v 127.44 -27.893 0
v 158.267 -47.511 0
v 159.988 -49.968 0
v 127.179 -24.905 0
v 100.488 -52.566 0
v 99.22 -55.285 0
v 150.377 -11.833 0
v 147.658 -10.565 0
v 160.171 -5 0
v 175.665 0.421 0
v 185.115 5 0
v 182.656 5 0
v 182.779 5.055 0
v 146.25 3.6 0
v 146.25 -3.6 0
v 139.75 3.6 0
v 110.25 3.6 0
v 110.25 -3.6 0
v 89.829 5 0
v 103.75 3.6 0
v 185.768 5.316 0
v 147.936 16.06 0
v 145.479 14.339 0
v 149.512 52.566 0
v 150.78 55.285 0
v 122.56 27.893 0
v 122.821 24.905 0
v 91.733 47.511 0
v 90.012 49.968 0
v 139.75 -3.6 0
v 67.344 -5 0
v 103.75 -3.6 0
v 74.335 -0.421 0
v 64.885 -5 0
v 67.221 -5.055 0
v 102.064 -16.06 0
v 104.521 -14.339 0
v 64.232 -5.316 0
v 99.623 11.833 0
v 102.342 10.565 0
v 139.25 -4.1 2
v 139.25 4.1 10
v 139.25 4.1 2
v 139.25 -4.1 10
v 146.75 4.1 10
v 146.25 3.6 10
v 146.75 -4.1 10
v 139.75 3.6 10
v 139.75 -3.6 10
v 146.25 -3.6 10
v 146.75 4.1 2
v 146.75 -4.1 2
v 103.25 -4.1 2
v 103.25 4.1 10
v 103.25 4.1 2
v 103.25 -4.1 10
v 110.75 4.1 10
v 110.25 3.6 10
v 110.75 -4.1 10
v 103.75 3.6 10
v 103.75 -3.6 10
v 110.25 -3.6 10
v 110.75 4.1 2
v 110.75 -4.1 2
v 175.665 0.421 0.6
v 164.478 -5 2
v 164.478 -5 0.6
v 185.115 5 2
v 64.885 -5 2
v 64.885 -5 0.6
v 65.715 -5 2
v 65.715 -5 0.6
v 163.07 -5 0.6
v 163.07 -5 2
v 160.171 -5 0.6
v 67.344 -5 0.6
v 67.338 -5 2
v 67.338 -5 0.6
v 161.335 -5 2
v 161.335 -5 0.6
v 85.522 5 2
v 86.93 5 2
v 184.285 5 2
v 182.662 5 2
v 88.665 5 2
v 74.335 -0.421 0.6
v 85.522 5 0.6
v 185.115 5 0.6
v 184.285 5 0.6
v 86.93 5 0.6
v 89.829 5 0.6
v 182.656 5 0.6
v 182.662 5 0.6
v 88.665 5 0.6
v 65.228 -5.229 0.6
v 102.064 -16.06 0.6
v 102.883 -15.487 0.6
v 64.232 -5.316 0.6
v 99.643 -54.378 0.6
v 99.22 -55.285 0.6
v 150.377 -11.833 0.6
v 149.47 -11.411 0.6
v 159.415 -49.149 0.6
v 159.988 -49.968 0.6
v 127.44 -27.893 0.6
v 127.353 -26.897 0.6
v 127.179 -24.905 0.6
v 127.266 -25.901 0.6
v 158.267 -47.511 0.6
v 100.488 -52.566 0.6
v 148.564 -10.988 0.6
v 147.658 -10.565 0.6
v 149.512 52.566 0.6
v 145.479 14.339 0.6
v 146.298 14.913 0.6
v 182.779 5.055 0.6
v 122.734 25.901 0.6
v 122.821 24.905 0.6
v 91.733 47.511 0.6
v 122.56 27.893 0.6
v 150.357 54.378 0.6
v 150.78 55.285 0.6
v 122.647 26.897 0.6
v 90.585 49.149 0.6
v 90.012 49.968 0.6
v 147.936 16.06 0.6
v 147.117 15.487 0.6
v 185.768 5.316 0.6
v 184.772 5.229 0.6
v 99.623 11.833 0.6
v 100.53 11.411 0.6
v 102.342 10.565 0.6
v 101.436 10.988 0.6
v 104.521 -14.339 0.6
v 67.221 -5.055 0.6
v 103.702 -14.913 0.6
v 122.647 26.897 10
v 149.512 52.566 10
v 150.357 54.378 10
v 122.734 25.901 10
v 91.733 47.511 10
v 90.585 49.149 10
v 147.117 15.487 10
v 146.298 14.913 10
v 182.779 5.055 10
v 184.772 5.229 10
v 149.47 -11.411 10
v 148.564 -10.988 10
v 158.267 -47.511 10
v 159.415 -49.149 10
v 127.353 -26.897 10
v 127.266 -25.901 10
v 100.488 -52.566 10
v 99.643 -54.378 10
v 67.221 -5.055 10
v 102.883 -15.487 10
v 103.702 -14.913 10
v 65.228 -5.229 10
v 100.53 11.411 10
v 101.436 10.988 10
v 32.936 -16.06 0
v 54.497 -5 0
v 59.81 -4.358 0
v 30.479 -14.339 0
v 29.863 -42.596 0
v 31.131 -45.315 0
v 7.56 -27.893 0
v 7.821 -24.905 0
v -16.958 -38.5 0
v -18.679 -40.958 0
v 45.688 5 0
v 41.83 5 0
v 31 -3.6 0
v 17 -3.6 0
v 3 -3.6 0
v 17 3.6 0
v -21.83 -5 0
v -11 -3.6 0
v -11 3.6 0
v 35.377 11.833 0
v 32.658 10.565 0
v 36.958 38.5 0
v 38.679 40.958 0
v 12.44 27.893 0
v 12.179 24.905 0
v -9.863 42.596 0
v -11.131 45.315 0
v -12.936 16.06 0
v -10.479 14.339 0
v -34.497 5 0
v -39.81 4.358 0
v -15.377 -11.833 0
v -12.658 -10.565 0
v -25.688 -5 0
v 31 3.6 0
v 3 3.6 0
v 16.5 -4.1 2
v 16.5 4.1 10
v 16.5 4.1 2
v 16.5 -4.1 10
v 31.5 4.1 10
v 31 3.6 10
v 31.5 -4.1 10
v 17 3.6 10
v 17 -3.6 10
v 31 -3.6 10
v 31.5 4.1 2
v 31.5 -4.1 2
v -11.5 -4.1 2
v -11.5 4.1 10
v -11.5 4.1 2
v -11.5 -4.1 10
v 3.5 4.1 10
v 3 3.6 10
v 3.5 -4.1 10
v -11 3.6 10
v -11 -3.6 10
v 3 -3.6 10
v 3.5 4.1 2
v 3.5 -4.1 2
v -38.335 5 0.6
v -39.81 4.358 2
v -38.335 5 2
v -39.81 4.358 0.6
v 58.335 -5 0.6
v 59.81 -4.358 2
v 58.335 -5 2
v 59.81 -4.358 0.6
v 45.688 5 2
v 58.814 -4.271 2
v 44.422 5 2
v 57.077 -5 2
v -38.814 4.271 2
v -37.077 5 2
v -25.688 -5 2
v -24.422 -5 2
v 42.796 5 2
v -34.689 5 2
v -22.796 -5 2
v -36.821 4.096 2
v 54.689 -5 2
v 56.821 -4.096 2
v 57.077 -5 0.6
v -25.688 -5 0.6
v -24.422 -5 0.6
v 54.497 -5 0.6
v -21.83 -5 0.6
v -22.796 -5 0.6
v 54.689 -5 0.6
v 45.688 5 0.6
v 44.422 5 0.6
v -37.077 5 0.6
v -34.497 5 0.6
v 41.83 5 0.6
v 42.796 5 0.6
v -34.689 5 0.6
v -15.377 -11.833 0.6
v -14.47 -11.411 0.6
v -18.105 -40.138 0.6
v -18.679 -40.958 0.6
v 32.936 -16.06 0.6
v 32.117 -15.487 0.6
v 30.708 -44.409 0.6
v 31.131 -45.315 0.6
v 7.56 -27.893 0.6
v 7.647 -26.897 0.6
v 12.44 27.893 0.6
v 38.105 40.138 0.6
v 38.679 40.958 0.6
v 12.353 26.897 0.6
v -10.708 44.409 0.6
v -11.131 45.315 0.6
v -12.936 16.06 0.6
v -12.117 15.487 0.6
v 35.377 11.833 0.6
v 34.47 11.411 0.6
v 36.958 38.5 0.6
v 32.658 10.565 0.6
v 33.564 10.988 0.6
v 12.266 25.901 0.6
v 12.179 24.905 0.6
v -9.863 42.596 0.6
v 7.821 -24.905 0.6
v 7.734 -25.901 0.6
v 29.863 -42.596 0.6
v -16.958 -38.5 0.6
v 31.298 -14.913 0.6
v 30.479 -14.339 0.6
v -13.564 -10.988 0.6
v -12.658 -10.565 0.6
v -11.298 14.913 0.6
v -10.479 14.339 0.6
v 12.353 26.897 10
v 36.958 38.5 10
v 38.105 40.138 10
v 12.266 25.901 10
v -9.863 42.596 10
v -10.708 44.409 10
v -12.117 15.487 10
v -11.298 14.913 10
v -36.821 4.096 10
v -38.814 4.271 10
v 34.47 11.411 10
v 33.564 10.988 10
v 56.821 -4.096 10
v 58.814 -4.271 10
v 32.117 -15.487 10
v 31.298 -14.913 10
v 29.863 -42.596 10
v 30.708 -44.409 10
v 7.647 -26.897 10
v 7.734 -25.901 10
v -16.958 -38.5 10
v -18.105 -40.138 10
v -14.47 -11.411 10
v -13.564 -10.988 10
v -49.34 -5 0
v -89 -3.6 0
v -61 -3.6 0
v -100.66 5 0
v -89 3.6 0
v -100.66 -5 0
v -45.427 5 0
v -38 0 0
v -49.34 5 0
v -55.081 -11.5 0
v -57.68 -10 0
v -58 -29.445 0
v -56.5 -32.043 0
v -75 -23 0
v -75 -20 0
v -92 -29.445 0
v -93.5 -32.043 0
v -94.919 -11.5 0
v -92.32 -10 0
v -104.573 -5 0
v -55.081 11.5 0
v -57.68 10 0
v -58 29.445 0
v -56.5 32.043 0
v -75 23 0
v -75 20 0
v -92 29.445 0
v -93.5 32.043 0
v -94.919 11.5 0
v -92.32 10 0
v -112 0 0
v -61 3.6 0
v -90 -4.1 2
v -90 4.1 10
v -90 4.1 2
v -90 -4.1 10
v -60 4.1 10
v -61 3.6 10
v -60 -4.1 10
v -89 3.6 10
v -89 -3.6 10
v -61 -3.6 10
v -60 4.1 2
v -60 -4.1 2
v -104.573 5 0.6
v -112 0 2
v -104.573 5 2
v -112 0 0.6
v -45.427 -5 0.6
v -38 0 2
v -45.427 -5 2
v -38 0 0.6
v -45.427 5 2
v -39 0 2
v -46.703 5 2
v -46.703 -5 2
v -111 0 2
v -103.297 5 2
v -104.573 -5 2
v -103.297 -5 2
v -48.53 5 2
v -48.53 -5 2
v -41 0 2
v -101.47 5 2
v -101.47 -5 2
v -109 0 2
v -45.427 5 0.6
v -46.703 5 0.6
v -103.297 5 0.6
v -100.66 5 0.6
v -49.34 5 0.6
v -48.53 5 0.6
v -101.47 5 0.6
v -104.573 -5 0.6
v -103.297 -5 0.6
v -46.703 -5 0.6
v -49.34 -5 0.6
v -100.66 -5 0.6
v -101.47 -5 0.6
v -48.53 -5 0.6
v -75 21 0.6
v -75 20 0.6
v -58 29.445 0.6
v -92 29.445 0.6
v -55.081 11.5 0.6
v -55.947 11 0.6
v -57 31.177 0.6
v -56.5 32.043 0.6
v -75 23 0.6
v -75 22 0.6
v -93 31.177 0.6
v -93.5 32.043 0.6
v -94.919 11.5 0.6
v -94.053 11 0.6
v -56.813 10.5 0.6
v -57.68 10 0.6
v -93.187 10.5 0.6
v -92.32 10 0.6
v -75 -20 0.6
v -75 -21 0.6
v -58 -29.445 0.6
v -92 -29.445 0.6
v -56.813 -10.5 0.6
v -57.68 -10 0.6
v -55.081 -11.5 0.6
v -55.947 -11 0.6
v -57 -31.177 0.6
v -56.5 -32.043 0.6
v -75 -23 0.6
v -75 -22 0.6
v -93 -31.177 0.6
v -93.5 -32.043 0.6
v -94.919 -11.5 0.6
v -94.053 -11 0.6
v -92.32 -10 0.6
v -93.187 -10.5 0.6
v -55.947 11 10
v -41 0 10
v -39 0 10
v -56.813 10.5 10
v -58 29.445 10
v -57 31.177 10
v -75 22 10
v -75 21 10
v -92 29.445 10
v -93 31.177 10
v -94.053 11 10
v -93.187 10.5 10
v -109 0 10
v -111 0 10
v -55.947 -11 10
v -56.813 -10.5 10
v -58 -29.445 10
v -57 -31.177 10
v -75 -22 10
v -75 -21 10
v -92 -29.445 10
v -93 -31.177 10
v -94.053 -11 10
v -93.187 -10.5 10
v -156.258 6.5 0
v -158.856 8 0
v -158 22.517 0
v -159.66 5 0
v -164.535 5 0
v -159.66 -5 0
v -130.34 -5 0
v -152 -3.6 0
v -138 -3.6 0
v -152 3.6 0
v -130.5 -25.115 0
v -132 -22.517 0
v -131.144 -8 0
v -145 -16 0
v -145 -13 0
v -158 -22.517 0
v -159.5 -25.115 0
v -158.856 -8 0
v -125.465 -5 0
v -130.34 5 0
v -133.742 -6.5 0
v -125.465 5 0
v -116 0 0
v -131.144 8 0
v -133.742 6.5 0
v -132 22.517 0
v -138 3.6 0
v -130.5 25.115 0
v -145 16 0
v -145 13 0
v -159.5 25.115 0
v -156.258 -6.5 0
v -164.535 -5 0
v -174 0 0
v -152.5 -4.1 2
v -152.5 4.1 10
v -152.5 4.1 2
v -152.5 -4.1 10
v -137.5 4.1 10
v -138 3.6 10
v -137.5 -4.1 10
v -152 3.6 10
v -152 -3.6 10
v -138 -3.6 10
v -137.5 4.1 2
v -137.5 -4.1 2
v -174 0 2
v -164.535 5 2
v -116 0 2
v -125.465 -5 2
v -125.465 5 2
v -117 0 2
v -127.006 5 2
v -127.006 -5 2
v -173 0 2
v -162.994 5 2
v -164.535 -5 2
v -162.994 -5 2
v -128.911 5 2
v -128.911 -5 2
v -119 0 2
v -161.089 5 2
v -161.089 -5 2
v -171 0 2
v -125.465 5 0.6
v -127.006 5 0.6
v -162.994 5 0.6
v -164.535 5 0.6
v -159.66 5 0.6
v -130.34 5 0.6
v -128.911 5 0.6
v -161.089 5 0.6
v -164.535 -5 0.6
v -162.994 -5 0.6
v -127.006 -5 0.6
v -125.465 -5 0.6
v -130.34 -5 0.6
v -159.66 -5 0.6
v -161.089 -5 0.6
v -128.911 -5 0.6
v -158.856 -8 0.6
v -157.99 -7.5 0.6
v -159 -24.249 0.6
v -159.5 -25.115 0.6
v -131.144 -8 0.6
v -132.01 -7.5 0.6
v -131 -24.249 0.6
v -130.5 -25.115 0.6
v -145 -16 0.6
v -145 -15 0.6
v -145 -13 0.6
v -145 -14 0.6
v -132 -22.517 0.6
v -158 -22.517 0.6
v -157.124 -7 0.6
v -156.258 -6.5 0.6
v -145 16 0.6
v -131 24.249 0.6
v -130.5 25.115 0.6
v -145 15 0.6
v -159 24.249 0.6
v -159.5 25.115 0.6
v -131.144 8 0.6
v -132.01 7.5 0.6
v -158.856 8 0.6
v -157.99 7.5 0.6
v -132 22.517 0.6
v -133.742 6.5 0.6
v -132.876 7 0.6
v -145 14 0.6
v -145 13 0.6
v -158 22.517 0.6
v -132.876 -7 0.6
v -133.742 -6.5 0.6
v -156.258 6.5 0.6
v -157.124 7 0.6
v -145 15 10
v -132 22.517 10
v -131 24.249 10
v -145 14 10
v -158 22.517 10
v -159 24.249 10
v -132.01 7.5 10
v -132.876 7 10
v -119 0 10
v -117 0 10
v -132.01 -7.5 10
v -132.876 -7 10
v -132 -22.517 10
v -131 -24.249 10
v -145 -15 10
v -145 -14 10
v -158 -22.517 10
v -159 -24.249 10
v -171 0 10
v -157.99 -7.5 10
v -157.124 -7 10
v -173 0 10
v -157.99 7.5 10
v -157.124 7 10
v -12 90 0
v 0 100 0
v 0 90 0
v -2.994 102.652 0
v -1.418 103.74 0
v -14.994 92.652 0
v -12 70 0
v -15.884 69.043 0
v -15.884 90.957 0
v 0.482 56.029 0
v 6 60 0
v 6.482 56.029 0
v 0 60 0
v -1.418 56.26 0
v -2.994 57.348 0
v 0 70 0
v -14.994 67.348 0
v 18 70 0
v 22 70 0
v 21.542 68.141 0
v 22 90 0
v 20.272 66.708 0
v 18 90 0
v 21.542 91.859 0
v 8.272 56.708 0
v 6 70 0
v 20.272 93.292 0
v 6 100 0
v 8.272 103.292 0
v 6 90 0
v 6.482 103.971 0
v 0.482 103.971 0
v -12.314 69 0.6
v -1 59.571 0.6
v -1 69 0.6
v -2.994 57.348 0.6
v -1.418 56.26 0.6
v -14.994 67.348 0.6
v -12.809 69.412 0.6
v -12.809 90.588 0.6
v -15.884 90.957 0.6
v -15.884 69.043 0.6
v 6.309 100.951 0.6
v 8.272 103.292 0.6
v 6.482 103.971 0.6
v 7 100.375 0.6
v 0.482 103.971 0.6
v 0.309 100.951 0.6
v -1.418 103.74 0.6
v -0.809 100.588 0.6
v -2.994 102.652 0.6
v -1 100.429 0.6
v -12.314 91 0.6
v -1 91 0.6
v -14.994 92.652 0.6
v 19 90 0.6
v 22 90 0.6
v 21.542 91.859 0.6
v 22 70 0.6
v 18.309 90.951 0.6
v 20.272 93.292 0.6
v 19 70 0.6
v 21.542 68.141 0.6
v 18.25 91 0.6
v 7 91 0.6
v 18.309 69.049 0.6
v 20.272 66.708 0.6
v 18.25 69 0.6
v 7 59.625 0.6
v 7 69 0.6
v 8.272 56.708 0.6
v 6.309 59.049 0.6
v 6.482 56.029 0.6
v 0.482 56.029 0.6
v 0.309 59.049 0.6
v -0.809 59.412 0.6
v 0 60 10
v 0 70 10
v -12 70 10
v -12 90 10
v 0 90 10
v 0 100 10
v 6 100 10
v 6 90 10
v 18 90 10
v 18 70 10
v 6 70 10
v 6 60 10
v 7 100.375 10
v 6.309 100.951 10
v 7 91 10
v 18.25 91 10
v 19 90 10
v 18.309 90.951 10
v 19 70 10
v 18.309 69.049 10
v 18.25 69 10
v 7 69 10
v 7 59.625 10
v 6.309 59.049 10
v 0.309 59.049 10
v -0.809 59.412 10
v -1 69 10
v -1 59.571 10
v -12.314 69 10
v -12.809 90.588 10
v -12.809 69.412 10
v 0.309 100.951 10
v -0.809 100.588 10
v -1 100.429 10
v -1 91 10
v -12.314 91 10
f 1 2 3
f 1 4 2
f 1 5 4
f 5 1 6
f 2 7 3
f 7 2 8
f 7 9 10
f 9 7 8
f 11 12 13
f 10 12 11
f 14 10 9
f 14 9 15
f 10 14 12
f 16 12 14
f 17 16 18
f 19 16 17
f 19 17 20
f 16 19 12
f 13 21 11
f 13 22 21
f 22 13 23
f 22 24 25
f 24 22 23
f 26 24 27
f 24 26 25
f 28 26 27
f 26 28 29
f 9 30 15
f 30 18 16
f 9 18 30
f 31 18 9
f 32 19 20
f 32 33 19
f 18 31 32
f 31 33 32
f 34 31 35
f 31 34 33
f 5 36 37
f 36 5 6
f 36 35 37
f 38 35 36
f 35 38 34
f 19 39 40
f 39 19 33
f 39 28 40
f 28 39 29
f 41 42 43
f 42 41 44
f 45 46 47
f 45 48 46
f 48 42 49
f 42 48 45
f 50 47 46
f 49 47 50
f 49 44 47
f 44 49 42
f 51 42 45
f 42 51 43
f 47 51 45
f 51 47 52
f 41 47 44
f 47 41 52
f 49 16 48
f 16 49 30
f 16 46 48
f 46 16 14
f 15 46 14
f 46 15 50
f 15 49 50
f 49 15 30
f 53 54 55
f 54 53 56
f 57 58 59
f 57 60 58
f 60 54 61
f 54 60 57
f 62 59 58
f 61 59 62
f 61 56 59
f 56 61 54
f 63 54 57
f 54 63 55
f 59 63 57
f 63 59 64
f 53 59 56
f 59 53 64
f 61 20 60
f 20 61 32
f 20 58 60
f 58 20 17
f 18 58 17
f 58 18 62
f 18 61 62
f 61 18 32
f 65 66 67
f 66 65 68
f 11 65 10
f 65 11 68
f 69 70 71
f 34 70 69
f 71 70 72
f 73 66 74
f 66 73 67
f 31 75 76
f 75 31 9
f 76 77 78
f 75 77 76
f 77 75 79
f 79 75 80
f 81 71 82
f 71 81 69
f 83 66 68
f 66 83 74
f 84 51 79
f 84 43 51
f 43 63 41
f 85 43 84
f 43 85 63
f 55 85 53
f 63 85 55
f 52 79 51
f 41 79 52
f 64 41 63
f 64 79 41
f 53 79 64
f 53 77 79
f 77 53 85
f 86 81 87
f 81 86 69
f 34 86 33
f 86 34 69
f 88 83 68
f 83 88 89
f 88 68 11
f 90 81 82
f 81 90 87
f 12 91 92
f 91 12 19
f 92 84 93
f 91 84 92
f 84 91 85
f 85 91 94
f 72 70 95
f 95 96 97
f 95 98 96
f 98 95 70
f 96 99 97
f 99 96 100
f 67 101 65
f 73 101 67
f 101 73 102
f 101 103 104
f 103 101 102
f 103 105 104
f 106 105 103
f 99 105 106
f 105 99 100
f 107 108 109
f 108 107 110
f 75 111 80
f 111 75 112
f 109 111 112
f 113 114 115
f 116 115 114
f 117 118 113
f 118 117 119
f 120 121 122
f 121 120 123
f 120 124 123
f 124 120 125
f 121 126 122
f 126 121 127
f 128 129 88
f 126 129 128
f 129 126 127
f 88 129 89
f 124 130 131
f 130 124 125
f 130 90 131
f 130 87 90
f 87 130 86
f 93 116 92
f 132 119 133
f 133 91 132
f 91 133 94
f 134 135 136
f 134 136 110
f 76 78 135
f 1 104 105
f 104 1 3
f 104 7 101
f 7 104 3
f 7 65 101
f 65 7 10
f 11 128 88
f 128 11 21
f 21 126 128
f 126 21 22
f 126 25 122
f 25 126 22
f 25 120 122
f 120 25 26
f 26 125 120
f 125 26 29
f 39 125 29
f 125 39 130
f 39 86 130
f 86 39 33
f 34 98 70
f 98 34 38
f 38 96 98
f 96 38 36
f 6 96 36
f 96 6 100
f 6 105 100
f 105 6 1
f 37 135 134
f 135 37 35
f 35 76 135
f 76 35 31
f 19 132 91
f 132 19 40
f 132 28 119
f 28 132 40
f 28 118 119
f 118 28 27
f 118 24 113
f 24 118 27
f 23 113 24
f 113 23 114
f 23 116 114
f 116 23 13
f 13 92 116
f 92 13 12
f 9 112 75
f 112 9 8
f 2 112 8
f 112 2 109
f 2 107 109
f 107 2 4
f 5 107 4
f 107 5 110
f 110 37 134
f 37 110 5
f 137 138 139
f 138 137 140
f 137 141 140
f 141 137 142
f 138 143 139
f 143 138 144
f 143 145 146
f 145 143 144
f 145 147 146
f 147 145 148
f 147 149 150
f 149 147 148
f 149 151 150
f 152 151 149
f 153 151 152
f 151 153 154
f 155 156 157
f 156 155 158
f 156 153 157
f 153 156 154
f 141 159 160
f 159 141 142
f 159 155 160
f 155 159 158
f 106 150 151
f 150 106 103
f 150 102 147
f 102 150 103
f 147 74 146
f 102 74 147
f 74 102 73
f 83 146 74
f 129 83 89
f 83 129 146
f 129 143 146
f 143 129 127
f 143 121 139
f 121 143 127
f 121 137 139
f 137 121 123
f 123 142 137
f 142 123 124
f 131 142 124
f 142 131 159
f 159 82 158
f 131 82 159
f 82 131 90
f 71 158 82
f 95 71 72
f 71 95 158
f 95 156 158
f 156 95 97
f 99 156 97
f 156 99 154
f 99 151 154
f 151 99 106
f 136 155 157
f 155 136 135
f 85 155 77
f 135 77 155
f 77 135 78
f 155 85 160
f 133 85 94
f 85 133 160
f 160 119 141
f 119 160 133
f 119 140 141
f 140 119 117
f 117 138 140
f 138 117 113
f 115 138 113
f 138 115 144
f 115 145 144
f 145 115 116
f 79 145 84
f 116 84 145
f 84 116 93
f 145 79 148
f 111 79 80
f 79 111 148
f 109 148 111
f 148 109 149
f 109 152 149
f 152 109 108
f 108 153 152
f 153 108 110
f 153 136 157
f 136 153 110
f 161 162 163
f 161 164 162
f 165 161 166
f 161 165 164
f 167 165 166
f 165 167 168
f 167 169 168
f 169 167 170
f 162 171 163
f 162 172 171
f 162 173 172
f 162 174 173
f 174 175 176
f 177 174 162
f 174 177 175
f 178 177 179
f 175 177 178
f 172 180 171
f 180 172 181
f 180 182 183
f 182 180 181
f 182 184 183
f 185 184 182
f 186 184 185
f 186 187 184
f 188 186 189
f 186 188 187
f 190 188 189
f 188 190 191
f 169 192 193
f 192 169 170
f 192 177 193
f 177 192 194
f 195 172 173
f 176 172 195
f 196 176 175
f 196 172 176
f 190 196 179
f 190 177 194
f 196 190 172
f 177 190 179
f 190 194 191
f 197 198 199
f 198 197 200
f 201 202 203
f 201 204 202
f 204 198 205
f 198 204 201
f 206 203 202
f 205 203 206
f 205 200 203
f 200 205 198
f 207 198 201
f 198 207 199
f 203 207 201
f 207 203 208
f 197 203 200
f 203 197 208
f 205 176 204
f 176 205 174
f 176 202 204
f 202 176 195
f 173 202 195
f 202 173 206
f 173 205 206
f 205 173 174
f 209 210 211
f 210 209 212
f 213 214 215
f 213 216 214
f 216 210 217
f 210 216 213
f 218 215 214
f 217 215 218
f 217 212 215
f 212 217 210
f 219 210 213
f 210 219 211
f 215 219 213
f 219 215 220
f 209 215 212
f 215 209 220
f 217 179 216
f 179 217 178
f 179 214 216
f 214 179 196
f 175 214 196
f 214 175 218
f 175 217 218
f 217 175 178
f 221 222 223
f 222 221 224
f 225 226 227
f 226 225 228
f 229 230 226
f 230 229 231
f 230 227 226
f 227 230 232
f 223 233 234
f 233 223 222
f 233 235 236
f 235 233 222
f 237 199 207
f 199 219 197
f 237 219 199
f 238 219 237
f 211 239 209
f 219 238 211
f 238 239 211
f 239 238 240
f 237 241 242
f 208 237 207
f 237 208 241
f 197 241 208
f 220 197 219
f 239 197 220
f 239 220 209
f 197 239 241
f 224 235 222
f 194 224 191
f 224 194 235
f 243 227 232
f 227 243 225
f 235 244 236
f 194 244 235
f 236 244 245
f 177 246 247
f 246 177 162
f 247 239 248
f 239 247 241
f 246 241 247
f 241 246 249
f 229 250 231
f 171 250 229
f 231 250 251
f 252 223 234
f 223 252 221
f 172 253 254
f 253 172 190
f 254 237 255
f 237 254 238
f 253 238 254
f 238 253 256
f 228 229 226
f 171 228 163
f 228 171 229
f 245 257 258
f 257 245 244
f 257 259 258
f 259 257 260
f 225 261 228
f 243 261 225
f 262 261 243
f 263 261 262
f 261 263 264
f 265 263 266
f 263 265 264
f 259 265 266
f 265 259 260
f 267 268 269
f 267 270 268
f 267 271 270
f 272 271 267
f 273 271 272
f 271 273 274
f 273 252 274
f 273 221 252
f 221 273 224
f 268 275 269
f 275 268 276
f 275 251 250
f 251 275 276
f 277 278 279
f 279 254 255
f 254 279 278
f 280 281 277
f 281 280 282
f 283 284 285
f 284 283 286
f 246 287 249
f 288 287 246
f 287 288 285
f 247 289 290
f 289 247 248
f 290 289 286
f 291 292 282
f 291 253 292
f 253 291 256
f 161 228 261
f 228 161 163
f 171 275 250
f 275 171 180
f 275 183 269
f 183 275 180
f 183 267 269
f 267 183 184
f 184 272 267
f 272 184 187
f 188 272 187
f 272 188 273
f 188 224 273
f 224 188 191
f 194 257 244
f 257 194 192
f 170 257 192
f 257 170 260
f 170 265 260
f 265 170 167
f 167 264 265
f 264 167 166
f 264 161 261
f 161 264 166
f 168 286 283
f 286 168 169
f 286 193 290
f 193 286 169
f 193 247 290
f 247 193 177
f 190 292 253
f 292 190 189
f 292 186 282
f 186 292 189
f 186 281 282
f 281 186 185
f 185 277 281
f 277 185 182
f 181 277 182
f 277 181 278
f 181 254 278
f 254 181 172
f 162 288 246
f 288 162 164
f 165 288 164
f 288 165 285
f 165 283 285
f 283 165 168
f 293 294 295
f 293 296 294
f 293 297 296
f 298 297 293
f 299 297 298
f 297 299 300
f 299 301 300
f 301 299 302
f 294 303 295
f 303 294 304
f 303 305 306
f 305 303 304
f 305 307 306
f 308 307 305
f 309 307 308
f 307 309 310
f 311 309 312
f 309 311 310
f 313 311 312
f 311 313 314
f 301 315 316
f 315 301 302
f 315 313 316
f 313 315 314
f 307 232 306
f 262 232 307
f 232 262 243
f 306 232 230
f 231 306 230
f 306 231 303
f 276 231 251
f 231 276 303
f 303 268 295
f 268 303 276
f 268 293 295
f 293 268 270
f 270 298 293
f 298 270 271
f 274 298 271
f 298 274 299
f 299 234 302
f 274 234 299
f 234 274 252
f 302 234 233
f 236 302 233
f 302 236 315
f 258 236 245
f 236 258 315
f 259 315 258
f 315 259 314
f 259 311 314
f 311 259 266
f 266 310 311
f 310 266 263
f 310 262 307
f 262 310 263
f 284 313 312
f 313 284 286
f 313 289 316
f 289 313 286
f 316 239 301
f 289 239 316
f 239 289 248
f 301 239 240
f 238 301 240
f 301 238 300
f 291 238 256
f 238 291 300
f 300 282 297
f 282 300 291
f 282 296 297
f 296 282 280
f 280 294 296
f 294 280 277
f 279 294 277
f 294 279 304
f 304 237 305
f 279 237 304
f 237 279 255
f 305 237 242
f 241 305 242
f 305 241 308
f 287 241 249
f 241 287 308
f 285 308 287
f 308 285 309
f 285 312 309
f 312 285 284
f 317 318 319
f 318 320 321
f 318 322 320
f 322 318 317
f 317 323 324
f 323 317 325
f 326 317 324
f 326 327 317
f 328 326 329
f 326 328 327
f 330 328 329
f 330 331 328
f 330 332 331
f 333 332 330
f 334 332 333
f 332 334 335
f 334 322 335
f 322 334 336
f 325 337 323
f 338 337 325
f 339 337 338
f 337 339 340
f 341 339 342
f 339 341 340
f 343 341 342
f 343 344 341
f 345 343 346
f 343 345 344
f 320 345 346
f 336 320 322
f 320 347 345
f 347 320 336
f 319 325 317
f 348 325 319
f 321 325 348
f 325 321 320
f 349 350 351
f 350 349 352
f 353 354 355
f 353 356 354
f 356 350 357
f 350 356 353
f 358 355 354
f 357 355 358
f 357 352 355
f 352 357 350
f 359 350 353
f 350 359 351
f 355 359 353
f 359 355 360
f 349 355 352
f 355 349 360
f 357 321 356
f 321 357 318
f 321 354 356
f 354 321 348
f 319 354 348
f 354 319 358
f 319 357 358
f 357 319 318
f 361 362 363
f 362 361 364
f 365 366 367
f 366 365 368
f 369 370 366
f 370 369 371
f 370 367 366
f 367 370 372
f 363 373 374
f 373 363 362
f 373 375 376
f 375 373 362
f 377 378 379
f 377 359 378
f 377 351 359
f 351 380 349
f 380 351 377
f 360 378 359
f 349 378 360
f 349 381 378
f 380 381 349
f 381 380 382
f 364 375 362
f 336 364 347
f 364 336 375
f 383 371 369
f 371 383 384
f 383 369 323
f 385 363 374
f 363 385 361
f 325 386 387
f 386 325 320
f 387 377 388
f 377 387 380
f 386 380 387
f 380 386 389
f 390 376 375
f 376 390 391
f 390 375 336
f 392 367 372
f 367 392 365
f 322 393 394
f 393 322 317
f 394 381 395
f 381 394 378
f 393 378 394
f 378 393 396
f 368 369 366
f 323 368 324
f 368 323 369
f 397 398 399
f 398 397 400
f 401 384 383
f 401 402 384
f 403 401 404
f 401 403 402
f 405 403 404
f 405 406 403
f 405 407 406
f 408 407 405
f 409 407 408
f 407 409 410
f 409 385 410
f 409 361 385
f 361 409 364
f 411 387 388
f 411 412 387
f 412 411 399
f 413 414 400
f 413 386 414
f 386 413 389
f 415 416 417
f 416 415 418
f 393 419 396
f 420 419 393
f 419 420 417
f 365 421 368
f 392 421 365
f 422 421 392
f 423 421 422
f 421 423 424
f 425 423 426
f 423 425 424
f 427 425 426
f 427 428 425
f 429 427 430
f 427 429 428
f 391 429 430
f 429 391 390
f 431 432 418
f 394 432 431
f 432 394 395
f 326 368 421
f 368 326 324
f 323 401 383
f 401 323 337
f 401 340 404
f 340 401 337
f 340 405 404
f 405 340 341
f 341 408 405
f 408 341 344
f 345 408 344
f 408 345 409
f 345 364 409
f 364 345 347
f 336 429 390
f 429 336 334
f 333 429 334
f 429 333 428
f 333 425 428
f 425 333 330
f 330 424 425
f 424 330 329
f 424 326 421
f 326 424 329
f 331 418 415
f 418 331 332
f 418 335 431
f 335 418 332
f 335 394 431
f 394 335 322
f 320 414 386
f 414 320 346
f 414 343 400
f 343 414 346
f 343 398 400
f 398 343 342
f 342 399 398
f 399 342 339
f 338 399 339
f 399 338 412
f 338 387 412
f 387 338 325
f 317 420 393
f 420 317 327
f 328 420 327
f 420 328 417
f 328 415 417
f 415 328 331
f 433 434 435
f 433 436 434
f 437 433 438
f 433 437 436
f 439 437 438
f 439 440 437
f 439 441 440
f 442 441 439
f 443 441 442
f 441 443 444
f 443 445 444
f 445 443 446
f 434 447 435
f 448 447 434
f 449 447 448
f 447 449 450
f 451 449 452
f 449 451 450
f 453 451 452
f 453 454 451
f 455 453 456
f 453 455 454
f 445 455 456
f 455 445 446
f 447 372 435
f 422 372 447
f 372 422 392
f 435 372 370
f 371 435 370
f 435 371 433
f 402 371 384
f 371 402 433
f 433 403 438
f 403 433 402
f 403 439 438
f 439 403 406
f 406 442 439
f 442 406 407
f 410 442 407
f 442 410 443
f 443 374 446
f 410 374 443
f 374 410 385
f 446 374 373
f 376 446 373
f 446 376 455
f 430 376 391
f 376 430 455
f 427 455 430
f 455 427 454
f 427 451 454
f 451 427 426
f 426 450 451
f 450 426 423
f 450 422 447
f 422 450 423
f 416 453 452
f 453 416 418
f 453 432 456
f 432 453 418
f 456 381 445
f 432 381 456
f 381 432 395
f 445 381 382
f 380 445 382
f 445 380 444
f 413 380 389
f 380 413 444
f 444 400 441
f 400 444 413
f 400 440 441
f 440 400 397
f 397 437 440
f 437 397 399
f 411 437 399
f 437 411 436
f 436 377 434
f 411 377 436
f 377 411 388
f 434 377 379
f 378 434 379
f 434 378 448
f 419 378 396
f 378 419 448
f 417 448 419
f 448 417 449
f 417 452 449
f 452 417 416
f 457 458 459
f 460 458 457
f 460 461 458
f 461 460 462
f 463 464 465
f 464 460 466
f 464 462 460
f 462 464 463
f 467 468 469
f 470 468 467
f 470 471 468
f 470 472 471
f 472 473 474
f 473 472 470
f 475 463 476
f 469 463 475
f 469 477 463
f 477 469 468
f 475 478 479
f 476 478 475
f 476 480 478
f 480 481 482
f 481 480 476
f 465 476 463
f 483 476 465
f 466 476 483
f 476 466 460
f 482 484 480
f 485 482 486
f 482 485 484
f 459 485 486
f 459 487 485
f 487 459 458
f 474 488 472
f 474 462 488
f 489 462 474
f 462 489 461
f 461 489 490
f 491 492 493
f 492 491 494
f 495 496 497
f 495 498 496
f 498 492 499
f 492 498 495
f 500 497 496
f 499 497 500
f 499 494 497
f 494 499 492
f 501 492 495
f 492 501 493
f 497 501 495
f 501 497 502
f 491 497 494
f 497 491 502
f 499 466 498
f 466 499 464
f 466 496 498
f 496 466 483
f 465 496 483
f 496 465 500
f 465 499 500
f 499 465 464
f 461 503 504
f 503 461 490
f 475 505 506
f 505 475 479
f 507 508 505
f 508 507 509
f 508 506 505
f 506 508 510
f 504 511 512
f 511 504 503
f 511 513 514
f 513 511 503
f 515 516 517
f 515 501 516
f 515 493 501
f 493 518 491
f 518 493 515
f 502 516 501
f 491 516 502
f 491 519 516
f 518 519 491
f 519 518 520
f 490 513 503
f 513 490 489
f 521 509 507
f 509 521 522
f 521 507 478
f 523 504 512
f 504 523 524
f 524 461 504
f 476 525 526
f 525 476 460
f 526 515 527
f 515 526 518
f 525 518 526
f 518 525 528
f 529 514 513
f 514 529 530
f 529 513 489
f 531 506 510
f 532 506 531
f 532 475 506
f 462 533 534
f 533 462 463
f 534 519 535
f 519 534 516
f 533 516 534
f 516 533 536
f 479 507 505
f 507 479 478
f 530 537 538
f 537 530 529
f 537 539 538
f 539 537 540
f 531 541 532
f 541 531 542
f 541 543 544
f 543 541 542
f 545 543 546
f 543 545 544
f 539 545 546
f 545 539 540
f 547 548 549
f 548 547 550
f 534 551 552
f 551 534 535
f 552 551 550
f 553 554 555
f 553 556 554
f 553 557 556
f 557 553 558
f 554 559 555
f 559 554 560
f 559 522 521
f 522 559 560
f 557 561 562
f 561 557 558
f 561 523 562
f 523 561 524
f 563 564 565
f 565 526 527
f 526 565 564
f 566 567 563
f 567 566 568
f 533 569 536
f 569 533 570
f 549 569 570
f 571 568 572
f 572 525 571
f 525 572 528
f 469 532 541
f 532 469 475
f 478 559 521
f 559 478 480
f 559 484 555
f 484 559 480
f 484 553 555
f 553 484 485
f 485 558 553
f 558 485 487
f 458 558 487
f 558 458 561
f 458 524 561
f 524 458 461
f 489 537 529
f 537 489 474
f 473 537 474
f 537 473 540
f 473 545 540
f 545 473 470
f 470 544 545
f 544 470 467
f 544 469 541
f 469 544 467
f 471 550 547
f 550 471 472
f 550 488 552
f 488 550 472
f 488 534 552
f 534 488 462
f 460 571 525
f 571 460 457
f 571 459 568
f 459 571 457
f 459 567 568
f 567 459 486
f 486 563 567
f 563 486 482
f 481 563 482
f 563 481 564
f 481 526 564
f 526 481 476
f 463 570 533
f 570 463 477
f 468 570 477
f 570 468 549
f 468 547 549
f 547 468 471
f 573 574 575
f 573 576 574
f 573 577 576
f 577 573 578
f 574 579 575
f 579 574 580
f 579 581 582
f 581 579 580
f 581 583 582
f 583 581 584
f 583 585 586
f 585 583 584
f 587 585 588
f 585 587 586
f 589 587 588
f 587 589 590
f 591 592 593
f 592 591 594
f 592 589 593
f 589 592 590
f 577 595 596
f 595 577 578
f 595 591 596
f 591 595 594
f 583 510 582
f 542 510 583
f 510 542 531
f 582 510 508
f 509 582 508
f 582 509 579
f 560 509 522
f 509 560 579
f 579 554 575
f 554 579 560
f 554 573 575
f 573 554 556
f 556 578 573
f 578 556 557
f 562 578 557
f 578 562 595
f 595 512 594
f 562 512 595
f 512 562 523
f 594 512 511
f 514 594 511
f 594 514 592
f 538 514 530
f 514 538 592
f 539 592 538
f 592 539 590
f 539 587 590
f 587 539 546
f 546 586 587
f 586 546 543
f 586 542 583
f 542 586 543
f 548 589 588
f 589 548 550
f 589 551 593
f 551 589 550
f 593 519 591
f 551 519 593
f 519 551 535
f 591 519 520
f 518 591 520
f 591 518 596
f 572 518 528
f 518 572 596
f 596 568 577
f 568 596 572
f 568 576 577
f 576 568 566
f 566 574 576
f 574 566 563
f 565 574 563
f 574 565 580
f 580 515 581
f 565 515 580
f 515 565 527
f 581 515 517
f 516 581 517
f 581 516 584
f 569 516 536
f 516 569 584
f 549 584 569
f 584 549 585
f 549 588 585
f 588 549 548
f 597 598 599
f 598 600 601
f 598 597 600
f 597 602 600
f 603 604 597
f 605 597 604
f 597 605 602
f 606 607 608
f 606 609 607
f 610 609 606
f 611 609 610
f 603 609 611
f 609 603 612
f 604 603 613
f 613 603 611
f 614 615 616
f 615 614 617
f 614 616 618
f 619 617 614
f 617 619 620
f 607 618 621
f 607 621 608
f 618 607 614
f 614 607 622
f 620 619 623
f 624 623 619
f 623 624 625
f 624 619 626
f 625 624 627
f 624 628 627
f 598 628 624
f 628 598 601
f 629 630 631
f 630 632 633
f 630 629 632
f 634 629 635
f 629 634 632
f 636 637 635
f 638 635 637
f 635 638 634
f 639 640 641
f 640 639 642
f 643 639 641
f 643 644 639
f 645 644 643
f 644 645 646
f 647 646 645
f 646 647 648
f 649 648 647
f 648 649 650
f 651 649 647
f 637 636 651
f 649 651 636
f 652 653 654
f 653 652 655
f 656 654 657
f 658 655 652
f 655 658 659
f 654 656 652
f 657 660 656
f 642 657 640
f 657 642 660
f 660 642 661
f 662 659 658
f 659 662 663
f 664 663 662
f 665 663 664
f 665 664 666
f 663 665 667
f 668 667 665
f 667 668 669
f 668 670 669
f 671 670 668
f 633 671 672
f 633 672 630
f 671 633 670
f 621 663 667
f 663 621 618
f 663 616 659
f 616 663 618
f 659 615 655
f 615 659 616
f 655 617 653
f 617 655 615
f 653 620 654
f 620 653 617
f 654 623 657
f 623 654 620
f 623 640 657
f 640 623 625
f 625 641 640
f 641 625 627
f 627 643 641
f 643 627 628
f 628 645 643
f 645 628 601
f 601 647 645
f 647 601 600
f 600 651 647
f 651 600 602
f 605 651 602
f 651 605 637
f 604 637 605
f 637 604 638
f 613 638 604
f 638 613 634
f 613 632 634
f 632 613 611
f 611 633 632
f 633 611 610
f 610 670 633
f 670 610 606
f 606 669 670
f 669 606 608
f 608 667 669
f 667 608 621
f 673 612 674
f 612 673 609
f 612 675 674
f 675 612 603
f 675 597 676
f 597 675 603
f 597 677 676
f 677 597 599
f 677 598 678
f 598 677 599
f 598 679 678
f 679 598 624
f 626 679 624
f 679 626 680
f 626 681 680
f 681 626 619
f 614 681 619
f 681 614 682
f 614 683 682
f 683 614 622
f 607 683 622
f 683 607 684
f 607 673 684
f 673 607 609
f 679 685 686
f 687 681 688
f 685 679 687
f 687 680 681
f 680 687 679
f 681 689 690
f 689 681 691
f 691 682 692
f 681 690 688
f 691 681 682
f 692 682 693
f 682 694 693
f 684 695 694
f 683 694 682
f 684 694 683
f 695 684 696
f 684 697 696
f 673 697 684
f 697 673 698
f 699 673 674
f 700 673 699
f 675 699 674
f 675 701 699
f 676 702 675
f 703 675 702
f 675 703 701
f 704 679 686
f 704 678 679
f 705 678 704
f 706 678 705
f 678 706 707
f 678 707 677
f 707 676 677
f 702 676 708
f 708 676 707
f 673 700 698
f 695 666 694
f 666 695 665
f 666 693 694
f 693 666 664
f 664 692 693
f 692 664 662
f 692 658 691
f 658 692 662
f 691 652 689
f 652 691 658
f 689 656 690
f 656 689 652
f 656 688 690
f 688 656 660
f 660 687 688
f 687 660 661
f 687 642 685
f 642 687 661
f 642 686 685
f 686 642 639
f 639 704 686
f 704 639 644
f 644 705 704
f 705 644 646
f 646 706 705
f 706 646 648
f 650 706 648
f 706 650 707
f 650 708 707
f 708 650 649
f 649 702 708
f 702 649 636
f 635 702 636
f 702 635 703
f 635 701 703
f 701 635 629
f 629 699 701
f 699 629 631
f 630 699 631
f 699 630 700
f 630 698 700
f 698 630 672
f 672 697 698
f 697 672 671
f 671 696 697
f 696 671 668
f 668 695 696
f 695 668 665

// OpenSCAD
fn=6;


// create 2d vector shape: circle
function circv(r=1,fn=32)=
[for(i=[0:fn-1])
[r*cos(360*i/fn),r*sin(360*i/fn)]
];

// create 2d vector shape: star
function starv(r1=1,r2=2,fn=32)=
[for(i=[0:(2*fn-1)])
(i%2==0)?
[r1*cos(180*i/fn),r1*sin(180*i/fn)]:
[r2*cos(180*i/fn),r2*sin(180*i/fn)]
];


// display a 2d vector shape
module dispv(v){
indi=[[for(i=[0:len(v)-1])i]];
polygon(points=v,paths=indi);
}
ep=10;
// etoile(nbdepointe,dia intérieur,diaextérieur,epaisseur,angle,decalageentretoiseN-1,0si dernierétage
translate([125,0,0])etoile(6,27,60,ep,35,18,7.5,1);
//translate([125,0,0])etoile(6,27,60,ep,35,14,15,1);
translate([10,0,0])etoile(6,27,49,ep,25,14,15,1);
translate([-75,0,0])etoile(6,22,36,ep,30,7,15,2);
translate([-145,0,0])etoile(6,15,28,ep,30,7,15,0);
translate([ 0,60,000])entretoise(ep);

module entretoise(epais)
{
e=10; //epaisseur de pate
h=20; //ecart entre les plateaux
l=6; //largeur du tenon
a=12; //largeur des aillettes
cercle1=4;
linear_extrude(.6)
difference(){
    hull() {
        translate([0,0]) circle(cercle1);
        translate([0,e]) circle(cercle1);
        translate([-a,e]) circle(cercle1);
        translate([-a,e+h]) circle(cercle1);
        translate([0,e+h]) circle(cercle1);
        translate([0,e+h+e]) circle(cercle1);
        translate([l,e+h+e]) circle(cercle1);
        translate([l,e+h]) circle(cercle1);
        translate([l+a,e+h]) circle(cercle1);
        translate([l+a,e]) circle(cercle1);
        translate([l,e]) circle(cercle1);
        translate([l,0]) circle(cercle1);
    }
polygon([[0,0],[0,e],[-a,e],
    [-a,e+h],[0,e+h],[0,e+h+e],[l,e+h+e],[l,e+h],
    [l+a,e+h],[l+a,e],[l,e],[l,0]]);
}

cercle=1;
linear_extrude(epais)
difference(){
    hull() {
        translate([0,0]) circle(cercle);
        translate([0,e]) circle(cercle);
        translate([-a,e]) circle(cercle);
        translate([-a,e+h]) circle(cercle);
        translate([0,e+h]) circle(cercle);
        translate([0,e+h+e]) circle(cercle);
        translate([l,e+h+e]) circle(cercle);
        translate([l,e+h]) circle(cercle);
        translate([l+a,e+h]) circle(cercle);
        translate([l+a,e]) circle(cercle);
        translate([l,e]) circle(cercle);
        translate([l,0]) circle(cercle);
    }
polygon([[0,0],[0,e],[-a,e],
    [-a,e+h],[0,e+h],[0,e+h+e],[l,e+h+e],[l,e+h],
    [l+a,e+h],[l+a,e],[l,e],[l,0]]);
polygon([[-1,-1],   [-1,e-1],    [-a-1,e-1],[-a-1,-1]]);
polygon([[-1,e+h+1],[-1,e+h+e+1],[-a-1,e+h+e+1],[-a-1,e+h+1]]);
polygon([[l+1,-1],   [l+1,e-1],    [l+a+1,e-1],[l+a+1,-1]]);
polygon([[l+1,e+h+1],[l+1,e+h+e+1],[l+a+1,e+h+e+1],[l+a+1,e+h+1]]);
}

}


module etoile(nb,et1,et2,epais,ang,dec1,larg1,dec2)
{
//etoile et decoupe
et11=starv(et1,et2,nb);
et12=starv(et1-1,et2-2,nb);
et21=starv(et1+1,et2+1,nb);
et22=starv(et1-2,et2-2,nb);

linear_extrude(.6)
    difference(){
//v0=starv(et1+1,et2+1,nb);
rotate([0,0,ang])translate([00,0,0])dispv(et21);

//v0=starv(et1-2,et2-2,fn);
rotate([0,0,ang])translate([00,0,0])dispv(et22);
}

linear_extrude(epais)
    difference(){
//v0=starv(et1,et2,nb);
rotate([0,0,ang])translate([00,0,0])dispv(et11);

//v0=starv(et1-2,et2-2,fn);
rotate([0,0,ang])translate([00,0,0])dispv(et12);
}




if (dec2==1){
difference(){
linear_extrude(epais)translate([dec1,0,0])square([larg1,8.2],center=true);
linear_extrude(epais)translate([dec1,0,0])square([larg1-1,7.2],center=true);
}
difference(){
linear_extrude(epais)translate([-dec1,0,0])square([larg1,8.2],center=true);
linear_extrude(epais)translate([-dec1,0,0])square([larg1-1,7.2],center=true);
}
}

if (dec2==1){
difference(){
linear_extrude(2)difference(){
rotate([0,0,ang])translate([00,0,0])dispv(et21);
translate([0,200/2+5,0])square([200,200],center=true);
translate([0,-200/2-5,0])square([200,200],center=true);
}
linear_extrude(2)translate([dec1,0,0])square([larg1-1,8.2],center=true);
linear_extrude(2)translate([-dec1,0,0])square([larg1-1,8.2],center=true);
}
}

if (dec2==2){
difference(){
linear_extrude(epais)translate([0,0,0])square([larg1*2,8.2],center=true);
linear_extrude(epais)translate([0,0,0])square([(larg1-1)*2,7.2],center=true);
}
}

if (dec2==2){
difference(){
linear_extrude(2)difference(){
rotate([0,0,ang])translate([00,0,0])dispv(et21);
translate([0,200/2+5,0])square([200,200],center=true);
translate([0,-200/2-5,0])square([200,200],center=true);
}
linear_extrude(2)translate([0,0,0])square([larg1*2,8.2],center=true);
}
}

if (dec2==0){
difference(){
linear_extrude(epais)translate([0,0,0])square([larg1,8.2],center=true);
linear_extrude(epais)translate([0,0,0])square([larg1-1,7.2],center=true);
}
}

if (dec2==0){
difference(){
    linear_extrude(2)
difference(){
rotate([0,0,ang])dispv(et21);
translate([0,100/2+5,0])square([100,100],center=true);
translate([0,-100/2-5,0])square([100,100],center=true);
}
linear_extrude(2)square([larg1,8.2],center=true);
}
}
}
